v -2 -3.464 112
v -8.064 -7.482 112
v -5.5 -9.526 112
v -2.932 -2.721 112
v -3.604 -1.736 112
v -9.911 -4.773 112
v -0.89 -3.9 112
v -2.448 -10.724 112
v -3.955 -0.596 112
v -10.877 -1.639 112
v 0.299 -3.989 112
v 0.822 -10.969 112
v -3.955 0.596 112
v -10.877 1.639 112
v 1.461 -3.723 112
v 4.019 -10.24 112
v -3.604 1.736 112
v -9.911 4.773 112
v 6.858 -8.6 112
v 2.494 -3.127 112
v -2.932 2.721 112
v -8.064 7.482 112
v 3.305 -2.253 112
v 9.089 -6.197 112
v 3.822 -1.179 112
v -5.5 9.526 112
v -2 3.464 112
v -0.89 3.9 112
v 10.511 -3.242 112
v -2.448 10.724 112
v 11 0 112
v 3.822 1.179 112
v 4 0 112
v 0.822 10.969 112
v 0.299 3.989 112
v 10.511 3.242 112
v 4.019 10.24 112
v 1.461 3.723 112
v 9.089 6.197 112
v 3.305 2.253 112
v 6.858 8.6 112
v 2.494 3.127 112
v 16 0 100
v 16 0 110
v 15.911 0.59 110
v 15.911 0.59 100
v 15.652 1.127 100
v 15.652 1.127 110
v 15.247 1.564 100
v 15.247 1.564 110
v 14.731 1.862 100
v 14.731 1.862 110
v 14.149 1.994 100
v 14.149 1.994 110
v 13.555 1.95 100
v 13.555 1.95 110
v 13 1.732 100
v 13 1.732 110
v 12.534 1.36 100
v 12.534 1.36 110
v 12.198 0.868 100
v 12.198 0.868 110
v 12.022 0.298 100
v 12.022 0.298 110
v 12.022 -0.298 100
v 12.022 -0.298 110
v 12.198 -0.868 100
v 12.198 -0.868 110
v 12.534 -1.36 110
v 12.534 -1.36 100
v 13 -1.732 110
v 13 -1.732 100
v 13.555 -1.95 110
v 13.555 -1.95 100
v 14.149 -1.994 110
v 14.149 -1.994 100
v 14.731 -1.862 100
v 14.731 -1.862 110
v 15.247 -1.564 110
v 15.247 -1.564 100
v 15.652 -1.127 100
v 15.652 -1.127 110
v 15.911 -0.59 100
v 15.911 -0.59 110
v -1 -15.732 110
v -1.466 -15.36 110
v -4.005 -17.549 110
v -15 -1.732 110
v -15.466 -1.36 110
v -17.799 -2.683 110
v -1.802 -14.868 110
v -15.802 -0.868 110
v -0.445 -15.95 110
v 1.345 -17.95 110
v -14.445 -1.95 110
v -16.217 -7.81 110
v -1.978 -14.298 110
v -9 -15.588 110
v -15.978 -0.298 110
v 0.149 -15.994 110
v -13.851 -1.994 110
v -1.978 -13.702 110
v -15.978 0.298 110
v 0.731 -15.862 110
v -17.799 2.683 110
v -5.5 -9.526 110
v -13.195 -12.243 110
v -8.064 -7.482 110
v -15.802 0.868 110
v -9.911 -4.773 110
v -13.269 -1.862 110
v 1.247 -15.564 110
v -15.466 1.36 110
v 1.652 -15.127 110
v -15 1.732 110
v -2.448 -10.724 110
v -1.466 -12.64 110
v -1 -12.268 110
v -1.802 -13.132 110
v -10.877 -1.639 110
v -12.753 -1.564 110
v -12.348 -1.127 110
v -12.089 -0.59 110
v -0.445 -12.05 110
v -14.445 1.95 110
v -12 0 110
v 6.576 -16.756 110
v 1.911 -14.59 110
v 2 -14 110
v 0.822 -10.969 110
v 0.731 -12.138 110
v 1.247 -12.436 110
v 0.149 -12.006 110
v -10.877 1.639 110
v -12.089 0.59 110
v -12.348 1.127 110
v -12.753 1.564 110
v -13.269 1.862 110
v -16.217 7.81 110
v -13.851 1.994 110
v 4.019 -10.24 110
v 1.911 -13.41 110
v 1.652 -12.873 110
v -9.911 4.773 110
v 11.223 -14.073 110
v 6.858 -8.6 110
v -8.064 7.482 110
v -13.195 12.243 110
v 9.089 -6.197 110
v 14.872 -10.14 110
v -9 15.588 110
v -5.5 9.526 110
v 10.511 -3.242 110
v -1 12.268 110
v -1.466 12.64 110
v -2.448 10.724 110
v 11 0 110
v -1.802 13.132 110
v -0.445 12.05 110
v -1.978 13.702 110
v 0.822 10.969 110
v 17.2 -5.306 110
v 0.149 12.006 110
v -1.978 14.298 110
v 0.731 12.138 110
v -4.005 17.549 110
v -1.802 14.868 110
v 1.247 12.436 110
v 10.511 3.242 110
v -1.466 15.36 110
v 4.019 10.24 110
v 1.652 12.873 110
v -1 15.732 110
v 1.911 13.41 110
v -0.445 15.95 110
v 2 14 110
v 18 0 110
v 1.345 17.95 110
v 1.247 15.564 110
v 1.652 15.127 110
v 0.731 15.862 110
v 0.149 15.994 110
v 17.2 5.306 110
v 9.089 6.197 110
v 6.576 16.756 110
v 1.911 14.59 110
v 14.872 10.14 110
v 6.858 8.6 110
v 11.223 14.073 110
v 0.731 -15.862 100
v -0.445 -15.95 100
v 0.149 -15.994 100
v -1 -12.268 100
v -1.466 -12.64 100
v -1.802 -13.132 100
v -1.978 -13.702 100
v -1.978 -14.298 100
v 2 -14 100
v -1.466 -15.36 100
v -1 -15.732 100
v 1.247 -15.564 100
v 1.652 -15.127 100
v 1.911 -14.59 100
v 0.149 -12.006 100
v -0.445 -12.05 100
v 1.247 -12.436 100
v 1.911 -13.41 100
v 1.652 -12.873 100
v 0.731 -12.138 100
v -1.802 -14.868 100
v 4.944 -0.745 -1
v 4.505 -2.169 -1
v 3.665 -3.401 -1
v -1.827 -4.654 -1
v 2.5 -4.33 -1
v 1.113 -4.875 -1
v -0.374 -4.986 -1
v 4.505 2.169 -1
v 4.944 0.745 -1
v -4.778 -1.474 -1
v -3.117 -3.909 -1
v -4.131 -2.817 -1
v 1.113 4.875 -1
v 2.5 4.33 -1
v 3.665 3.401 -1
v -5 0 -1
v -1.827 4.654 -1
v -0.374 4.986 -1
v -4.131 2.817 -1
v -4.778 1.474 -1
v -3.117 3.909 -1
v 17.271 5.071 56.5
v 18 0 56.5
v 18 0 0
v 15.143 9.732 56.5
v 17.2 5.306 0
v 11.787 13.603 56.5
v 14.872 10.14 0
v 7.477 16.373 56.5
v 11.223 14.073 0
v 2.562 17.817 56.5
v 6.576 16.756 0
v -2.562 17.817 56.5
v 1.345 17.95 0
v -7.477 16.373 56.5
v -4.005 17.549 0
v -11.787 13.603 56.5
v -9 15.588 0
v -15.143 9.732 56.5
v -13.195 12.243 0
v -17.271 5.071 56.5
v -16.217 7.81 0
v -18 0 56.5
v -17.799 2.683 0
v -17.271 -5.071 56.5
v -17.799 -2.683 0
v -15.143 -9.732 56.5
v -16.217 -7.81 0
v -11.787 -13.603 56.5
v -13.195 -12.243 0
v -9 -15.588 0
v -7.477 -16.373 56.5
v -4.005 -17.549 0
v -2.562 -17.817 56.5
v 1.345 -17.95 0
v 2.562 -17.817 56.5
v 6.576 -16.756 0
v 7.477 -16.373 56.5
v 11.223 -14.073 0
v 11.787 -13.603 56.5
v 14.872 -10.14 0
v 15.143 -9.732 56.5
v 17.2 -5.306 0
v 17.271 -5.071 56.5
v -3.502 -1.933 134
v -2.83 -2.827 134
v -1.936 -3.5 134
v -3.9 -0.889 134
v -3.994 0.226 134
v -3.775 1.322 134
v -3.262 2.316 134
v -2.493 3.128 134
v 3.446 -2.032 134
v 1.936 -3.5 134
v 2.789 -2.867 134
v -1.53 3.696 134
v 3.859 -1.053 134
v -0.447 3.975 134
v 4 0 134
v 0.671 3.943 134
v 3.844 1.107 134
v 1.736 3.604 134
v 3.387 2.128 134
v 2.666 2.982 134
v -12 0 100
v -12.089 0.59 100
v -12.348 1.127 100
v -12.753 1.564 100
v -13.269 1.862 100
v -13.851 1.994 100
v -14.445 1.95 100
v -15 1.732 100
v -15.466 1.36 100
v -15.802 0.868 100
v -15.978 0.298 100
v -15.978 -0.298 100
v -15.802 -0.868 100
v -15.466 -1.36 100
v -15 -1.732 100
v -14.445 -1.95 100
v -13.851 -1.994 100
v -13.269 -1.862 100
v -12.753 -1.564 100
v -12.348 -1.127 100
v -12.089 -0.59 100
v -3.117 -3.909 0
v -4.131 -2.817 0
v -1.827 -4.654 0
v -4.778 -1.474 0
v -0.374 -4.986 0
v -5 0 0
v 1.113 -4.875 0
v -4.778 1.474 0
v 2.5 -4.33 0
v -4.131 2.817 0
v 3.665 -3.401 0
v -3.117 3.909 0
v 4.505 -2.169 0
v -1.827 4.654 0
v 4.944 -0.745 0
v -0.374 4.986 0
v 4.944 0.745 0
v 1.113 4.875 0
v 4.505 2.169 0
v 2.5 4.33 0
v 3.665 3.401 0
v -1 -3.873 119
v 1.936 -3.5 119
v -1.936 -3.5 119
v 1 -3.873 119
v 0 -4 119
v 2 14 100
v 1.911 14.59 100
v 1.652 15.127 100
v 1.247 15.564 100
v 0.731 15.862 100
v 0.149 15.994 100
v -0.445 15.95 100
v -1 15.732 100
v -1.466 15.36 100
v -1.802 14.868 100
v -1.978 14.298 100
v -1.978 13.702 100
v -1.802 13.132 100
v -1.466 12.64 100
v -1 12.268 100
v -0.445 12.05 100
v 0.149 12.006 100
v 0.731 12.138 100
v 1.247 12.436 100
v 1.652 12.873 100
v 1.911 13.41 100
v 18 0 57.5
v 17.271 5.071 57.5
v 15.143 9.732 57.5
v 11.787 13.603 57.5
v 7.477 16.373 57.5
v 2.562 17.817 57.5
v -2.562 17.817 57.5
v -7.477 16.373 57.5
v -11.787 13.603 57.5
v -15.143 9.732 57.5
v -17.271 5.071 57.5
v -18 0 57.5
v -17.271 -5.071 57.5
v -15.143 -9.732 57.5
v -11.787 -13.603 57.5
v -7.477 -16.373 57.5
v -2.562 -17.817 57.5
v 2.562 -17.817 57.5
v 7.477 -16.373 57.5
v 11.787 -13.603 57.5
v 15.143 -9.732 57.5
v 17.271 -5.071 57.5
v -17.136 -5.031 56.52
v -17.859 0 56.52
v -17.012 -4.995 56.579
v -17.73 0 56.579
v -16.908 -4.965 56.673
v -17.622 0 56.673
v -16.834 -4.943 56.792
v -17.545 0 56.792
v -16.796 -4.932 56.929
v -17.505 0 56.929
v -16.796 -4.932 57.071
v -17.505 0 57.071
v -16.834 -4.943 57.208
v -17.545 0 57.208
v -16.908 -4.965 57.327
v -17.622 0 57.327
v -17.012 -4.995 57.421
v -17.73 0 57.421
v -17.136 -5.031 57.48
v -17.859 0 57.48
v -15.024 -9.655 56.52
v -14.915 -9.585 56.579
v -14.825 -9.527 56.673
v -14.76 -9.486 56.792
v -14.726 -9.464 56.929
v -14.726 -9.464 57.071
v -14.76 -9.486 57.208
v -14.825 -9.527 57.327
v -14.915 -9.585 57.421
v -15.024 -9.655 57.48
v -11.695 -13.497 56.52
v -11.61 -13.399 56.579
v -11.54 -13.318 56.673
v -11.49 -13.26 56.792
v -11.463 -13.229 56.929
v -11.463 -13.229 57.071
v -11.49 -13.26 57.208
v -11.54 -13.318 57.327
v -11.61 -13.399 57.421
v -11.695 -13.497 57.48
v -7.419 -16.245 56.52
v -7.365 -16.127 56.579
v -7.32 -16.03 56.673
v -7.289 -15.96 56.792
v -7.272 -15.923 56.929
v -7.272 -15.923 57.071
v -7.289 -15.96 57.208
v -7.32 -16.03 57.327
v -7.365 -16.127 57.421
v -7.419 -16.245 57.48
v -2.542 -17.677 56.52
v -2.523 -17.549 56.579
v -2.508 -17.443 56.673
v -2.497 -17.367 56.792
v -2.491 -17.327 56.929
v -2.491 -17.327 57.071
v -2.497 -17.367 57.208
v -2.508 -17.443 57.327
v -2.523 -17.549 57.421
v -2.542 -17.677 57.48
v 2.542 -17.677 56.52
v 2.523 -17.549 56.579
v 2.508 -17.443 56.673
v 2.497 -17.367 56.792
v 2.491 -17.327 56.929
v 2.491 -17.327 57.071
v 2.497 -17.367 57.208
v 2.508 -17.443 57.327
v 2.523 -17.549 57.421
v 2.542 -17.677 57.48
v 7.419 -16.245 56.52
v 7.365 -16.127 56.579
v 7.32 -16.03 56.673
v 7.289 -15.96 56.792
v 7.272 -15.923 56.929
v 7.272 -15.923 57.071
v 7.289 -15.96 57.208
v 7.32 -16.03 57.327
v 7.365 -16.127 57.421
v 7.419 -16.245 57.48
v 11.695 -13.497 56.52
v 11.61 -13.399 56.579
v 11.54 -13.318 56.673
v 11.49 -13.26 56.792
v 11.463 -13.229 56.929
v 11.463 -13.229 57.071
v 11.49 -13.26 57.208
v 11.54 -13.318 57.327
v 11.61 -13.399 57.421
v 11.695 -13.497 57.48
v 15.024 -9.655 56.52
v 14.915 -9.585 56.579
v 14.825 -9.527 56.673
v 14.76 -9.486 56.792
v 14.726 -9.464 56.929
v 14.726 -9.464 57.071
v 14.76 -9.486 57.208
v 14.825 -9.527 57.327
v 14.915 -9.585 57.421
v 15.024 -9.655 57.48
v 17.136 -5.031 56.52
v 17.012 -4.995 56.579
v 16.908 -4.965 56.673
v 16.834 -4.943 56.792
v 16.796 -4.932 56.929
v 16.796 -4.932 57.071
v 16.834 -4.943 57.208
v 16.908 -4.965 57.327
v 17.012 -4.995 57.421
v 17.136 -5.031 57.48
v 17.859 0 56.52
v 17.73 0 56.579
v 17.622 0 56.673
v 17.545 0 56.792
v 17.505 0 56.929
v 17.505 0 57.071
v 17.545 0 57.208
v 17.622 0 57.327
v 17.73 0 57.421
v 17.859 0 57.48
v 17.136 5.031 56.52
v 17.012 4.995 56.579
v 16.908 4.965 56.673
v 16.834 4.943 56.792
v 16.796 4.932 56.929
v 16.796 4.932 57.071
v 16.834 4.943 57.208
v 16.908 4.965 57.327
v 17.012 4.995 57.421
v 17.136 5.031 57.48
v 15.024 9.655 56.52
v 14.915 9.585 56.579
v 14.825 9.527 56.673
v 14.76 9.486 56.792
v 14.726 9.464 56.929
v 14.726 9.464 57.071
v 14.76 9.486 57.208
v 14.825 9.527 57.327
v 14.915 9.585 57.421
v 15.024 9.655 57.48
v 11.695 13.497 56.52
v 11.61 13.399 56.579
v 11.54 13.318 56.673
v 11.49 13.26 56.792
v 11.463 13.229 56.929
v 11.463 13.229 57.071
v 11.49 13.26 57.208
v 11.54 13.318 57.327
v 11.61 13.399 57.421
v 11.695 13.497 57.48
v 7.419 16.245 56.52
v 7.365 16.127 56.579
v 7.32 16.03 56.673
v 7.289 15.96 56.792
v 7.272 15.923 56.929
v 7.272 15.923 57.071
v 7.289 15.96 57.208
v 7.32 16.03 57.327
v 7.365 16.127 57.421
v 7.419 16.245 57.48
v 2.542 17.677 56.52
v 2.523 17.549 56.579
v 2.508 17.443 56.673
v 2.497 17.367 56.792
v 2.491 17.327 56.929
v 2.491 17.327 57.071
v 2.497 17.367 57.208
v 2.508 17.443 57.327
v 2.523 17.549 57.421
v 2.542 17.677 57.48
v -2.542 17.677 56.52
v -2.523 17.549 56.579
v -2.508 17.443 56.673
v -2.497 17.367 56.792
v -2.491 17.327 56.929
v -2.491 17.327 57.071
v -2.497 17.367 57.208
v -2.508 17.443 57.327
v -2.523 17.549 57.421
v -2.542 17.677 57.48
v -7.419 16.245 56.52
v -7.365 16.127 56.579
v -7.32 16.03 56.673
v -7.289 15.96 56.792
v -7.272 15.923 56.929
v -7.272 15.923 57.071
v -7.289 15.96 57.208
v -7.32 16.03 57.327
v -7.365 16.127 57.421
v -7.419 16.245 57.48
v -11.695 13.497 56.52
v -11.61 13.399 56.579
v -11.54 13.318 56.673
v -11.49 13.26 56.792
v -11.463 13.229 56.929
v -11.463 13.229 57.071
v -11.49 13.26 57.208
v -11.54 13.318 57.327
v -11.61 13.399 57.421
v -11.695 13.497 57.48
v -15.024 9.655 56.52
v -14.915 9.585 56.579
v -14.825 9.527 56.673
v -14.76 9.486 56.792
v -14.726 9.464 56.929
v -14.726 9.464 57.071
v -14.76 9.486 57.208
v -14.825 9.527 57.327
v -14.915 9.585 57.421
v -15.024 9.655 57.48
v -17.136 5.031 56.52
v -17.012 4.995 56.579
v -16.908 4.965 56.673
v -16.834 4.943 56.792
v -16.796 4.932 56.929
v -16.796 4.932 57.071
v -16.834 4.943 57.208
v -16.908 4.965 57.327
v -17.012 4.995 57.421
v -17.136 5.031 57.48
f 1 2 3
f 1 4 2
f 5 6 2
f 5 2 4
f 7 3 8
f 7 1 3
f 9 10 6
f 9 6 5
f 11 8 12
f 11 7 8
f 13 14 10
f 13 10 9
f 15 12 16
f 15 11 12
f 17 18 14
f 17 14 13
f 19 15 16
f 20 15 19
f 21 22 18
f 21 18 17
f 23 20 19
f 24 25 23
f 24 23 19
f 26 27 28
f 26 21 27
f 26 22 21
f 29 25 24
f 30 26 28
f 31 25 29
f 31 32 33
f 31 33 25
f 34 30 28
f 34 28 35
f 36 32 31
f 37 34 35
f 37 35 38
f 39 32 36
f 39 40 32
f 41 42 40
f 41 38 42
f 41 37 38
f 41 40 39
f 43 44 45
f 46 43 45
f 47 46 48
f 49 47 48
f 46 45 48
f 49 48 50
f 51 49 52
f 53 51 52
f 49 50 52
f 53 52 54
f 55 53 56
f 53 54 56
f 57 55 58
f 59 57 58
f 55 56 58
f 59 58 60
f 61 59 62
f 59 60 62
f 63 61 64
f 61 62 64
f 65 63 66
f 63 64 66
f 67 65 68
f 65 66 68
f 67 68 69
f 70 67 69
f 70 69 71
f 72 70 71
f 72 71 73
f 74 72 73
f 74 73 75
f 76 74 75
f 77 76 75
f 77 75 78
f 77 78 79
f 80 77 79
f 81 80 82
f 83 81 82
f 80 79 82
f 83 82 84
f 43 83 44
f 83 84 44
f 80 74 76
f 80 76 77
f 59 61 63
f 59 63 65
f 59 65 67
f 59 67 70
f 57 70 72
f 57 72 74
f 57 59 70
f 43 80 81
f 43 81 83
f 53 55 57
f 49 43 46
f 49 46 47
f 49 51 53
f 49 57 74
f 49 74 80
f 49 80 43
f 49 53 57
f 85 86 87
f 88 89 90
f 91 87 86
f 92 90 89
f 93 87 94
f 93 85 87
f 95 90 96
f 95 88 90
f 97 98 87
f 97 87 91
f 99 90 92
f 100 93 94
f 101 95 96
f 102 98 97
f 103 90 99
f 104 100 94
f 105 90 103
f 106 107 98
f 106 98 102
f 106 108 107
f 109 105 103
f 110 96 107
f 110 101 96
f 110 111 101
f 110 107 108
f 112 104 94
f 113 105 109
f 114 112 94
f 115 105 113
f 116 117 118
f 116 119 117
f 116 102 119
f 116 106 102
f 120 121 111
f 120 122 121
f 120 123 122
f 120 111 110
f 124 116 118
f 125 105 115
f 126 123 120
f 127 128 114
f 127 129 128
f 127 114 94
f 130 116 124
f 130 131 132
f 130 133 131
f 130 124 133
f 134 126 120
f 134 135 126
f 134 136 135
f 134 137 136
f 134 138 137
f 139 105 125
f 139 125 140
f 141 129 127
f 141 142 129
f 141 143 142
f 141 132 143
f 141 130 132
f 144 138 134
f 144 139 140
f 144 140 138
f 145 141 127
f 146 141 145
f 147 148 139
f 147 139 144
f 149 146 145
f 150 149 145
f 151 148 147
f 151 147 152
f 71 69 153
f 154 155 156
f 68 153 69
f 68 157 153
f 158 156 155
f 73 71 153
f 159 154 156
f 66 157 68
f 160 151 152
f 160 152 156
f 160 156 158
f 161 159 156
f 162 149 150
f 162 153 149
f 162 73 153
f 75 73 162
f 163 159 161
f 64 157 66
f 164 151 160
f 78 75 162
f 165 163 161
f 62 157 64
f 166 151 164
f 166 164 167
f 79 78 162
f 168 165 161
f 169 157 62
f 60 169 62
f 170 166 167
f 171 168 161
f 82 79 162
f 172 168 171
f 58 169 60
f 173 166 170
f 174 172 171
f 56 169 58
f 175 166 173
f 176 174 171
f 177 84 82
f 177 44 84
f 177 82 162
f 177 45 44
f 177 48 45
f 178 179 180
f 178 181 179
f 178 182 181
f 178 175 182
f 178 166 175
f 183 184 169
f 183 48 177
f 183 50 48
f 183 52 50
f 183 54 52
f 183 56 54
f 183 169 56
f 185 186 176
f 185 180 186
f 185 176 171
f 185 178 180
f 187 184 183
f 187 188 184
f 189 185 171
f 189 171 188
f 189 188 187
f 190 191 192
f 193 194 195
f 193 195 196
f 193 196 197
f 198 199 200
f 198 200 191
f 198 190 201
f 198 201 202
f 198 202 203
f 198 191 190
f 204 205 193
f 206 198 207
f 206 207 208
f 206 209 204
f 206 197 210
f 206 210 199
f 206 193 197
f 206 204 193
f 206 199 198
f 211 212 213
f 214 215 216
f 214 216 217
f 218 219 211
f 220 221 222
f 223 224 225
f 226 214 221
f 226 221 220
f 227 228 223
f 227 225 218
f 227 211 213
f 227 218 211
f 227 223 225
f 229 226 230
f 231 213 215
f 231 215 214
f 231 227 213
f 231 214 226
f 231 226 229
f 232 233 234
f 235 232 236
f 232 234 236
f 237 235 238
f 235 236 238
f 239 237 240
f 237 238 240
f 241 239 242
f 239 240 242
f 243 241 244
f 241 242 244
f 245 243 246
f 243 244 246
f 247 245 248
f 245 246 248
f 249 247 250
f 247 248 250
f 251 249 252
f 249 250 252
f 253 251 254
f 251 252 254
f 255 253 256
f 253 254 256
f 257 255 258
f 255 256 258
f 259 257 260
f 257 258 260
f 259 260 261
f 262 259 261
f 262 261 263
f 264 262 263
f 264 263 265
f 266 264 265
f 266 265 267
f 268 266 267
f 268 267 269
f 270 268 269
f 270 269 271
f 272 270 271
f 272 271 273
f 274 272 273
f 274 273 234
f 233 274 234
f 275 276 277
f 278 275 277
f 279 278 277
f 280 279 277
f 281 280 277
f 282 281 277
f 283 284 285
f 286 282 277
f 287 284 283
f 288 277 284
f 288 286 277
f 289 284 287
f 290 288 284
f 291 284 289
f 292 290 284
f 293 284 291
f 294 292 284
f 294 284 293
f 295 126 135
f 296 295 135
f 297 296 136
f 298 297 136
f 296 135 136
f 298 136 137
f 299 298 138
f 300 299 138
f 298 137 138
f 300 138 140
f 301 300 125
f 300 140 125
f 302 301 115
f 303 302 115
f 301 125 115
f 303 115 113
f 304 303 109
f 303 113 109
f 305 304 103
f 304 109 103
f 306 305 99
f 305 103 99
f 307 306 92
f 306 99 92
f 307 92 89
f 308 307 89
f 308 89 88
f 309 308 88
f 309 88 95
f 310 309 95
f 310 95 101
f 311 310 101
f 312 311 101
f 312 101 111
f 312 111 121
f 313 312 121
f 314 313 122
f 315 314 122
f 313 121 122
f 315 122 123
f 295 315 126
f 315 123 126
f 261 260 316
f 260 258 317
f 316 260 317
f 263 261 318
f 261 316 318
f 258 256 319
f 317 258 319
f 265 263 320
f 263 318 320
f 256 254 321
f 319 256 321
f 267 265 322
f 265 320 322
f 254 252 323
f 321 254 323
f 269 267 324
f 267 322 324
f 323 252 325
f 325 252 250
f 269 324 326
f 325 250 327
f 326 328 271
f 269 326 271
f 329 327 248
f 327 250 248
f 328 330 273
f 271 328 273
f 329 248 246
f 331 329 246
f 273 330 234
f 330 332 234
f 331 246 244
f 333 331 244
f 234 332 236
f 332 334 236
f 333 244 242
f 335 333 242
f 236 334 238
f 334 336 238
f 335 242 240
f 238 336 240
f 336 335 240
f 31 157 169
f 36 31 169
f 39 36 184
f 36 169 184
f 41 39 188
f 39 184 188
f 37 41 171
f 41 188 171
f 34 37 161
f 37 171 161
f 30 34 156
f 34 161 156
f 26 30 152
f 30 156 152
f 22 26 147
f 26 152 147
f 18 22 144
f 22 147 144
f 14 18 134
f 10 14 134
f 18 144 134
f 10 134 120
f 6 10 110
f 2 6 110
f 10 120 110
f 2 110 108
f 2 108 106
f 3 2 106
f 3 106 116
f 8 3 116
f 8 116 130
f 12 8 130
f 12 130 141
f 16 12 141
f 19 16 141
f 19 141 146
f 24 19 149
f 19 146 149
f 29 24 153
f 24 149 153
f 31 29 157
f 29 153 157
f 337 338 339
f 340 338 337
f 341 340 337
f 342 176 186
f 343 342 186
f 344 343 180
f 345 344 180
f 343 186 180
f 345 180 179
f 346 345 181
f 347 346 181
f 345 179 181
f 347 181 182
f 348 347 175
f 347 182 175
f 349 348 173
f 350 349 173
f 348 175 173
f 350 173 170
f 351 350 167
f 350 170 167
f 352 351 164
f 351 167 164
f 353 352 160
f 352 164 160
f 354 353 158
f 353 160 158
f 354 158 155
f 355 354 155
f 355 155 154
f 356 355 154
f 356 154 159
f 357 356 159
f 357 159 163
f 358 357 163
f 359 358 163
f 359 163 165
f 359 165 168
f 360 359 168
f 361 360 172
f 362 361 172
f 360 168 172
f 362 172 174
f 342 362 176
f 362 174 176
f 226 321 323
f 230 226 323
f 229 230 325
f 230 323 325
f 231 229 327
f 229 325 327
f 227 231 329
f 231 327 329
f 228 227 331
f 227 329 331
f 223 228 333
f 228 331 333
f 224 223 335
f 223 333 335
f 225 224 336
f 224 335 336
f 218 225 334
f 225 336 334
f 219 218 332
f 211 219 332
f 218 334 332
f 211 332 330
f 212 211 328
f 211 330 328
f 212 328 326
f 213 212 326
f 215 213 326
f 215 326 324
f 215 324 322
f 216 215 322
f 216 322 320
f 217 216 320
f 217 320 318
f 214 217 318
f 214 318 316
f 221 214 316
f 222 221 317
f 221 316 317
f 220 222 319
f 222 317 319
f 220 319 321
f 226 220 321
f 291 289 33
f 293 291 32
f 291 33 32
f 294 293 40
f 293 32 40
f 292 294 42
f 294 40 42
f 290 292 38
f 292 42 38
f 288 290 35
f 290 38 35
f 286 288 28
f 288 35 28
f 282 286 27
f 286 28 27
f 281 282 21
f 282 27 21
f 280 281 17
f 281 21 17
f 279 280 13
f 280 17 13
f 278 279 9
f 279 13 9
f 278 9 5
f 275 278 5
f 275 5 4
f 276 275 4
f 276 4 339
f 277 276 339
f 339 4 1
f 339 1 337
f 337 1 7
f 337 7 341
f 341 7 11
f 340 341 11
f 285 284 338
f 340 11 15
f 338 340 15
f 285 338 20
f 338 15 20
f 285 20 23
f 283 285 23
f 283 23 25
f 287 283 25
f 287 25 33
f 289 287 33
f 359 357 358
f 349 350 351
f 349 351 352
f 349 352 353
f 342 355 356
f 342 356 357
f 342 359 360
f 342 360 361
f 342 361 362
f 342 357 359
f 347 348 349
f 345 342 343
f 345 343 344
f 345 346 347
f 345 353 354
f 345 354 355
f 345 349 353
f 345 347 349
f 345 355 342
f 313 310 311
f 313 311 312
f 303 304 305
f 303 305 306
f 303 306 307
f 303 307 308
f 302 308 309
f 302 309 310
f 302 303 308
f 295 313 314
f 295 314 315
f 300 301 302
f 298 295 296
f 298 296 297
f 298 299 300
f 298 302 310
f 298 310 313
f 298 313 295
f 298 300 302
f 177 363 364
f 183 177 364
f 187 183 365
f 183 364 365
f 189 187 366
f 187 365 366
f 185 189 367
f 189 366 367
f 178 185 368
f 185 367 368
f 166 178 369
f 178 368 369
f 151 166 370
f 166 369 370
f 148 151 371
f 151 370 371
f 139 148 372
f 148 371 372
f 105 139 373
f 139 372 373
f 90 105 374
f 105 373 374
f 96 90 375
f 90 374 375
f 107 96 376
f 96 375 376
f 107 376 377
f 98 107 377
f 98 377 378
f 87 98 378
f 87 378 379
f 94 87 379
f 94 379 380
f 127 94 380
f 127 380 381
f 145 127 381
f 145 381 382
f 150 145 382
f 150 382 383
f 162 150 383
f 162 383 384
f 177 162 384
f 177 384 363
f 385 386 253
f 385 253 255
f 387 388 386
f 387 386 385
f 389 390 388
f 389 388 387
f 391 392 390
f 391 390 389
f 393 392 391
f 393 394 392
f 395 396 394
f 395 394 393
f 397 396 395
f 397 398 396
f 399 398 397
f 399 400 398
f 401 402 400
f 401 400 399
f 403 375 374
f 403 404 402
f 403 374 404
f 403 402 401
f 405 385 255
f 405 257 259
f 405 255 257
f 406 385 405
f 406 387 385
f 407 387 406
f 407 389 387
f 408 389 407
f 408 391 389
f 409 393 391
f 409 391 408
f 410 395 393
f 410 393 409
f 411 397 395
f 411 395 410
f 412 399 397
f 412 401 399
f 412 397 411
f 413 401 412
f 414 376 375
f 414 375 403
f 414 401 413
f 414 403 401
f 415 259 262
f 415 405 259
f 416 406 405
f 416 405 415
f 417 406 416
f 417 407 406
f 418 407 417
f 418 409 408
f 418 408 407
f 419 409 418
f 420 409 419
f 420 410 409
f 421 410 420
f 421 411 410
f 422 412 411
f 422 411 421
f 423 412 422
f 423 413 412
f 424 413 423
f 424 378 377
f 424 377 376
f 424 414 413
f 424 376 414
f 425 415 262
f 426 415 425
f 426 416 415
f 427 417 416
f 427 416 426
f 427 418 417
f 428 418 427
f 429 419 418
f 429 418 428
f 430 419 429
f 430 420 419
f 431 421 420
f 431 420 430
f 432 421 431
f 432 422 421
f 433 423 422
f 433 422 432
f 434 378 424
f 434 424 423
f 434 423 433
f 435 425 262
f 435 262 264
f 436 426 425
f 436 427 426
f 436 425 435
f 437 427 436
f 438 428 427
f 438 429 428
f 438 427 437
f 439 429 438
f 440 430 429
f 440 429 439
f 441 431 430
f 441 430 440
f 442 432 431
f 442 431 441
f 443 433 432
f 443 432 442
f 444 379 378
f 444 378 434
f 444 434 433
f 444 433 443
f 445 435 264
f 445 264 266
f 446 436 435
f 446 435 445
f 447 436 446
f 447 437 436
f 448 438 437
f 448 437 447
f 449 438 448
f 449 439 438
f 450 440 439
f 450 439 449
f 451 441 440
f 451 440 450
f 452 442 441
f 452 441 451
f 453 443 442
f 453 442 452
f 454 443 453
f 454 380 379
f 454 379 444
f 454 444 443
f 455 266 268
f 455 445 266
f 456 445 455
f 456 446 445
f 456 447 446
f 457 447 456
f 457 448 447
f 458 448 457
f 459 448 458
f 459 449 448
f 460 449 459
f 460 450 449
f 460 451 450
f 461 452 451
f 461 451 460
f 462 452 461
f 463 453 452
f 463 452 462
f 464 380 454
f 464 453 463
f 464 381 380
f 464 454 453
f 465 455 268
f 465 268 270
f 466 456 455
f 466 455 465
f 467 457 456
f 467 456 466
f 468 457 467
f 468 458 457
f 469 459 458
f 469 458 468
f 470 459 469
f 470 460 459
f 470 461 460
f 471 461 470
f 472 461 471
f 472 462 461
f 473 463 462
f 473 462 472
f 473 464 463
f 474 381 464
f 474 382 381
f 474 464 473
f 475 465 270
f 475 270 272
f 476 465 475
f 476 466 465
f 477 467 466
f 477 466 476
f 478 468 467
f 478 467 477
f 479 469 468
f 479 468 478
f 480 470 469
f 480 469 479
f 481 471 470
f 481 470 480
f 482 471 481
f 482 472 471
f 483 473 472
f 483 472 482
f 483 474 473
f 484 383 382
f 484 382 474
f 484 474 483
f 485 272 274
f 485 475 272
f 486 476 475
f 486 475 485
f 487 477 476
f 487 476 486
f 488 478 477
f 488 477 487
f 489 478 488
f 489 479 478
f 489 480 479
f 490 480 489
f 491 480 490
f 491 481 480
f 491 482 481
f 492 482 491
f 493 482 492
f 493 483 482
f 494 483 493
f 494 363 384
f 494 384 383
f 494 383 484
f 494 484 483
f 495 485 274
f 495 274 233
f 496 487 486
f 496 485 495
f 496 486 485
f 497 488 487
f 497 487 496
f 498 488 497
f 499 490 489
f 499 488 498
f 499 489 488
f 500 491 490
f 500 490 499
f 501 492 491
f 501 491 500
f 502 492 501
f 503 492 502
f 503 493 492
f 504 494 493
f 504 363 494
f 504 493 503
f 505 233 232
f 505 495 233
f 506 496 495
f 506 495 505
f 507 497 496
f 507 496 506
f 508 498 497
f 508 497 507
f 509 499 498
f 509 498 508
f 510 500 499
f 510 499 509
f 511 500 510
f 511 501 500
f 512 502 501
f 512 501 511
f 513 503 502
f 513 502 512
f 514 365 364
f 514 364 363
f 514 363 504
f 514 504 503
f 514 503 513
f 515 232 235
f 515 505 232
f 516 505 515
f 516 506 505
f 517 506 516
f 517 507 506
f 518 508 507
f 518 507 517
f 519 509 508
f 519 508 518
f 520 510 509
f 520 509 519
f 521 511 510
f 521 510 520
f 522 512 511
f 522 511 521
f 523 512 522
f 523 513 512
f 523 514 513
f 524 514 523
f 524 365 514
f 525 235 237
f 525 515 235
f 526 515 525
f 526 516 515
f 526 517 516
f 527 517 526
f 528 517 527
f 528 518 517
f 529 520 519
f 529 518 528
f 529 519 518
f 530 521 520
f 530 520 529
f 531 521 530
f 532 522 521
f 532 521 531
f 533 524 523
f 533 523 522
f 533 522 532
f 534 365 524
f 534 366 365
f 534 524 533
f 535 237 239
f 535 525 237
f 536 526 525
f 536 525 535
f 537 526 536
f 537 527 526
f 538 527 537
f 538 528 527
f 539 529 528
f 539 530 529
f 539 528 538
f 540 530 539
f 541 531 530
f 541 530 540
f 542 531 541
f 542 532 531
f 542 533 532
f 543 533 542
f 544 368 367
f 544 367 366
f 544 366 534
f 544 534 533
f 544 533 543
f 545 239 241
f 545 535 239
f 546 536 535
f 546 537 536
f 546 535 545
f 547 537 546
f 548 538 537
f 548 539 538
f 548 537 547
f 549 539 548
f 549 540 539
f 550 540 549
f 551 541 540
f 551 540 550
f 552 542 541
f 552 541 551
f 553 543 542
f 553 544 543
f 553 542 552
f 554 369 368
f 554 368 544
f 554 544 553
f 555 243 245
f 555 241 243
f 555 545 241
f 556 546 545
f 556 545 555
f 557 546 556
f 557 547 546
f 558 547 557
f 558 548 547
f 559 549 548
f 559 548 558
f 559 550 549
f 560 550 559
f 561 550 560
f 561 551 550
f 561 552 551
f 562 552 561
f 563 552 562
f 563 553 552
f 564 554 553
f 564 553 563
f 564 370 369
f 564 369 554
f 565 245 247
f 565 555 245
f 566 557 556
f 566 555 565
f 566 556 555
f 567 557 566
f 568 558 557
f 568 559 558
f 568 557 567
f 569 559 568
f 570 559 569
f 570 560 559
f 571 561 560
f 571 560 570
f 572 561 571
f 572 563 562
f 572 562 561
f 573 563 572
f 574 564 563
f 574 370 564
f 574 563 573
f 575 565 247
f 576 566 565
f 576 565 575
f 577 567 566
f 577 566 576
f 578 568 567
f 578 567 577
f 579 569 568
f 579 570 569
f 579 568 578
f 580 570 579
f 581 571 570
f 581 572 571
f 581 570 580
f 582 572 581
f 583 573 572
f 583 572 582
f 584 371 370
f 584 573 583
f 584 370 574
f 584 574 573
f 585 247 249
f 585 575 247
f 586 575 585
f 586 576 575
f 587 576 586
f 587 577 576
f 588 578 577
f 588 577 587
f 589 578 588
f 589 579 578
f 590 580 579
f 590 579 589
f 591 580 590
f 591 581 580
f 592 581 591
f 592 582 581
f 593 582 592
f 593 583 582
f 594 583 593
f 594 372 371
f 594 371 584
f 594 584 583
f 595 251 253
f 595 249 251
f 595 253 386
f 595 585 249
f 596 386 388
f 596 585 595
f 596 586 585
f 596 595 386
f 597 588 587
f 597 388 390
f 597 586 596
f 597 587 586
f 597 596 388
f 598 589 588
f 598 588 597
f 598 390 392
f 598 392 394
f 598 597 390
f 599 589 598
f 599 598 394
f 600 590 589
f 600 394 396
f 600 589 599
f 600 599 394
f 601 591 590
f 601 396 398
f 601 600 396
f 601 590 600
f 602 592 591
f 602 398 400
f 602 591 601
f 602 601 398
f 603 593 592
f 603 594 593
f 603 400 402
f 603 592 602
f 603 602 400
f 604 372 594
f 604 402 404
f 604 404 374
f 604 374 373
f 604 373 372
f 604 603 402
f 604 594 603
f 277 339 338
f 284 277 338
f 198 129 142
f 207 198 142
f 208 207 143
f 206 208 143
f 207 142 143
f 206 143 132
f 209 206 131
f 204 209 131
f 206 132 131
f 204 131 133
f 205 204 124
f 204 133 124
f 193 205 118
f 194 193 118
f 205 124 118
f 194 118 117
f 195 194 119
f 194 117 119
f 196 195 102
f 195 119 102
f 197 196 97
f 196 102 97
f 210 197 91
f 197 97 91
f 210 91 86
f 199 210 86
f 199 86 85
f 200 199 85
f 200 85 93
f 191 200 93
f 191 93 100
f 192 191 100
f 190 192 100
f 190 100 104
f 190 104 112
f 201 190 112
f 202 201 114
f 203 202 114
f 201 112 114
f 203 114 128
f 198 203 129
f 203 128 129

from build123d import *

# Parameters (mm, degrees)
SKETCH1_R           = 18
BOSS_EXTRUDE1_DEPTH = 110
SKETCH2_R           = 0.5
SKETCH3_R           = 11
BOSS_EXTRUDE2_DEPTH = 2
SKETCH4_R           = 4
BOSS_EXTRUDE3_DEPTH = 22
CUT_EXTRUDE1_START  = -15
CUT_EXTRUDE1_DEPTH  = 15
SKETCH6_R           = 5
BOSS_EXTRUDE4_DEPTH = 1
SKETCH7_R           = 2
CUT_EXTRUDE2_DEPTH  = 10


with BuildPart() as part:
    # Sketch1 → Boss-Extrude1 (new body)
    with BuildSketch(Plane.XY):
        Circle(SKETCH1_R)
    extrude(amount=BOSS_EXTRUDE1_DEPTH)

    # Sketch2 → Cut-Revolve1 (revolve, cut)
    with BuildSketch(Plane(origin=(0, 0, 0), x_dir=(1, 0, 0), z_dir=(0, 1, 0)), mode=Mode.PRIVATE) as cut_revolve1_sk:
        with Locations((18, -57)):
            Circle(SKETCH2_R)
    revolve(cut_revolve1_sk.sketch.rotate(Axis((0, 0, 0), (0, 0, 1)), 180), axis=Axis((0, 0, 0), (0, 0, 1)), mode=Mode.SUBTRACT)

    # Sketch3 → Boss-Extrude2 (add)
    with BuildSketch(Plane.XY.offset(110)):
        Circle(SKETCH3_R)
    extrude(amount=BOSS_EXTRUDE2_DEPTH)

    # Sketch4 → Boss-Extrude3 (add)
    with BuildSketch(Plane.XY.offset(112)):
        Circle(SKETCH4_R)
    extrude(amount=BOSS_EXTRUDE3_DEPTH)

    # Sketch5 → Cut-Extrude1 (cut)
    with BuildSketch(Plane.XY.offset(134).offset(CUT_EXTRUDE1_START)):
        with BuildLine():
            Line((-1.936491673, -3.5), (1.936491673, -3.5))
            ThreePointArc((1.936491673, -3.5), (0, -4), (-1.936491673, -3.5))
        make_face()
    extrude(amount=CUT_EXTRUDE1_DEPTH, mode=Mode.SUBTRACT)

    # Sketch6 → Boss-Extrude4 (add)
    with BuildSketch(Plane(origin=(0, 0, 0), x_dir=(-1, 0, 0), z_dir=(0, 0, -1))):
        Circle(SKETCH6_R)
    extrude(amount=BOSS_EXTRUDE4_DEPTH)

    # Sketch7 → Cut-Extrude2 (cut)
    with BuildSketch(Plane.XY.offset(110)):
        with Locations((14, 0)):
            Circle(SKETCH7_R)
        with Locations((0, -14)):
            Circle(SKETCH7_R)
        with Locations((-14, 0)):
            Circle(SKETCH7_R)
        with Locations((0, 14)):
            Circle(SKETCH7_R)
    extrude(amount=-CUT_EXTRUDE2_DEPTH, mode=Mode.SUBTRACT)


solid = part.part
